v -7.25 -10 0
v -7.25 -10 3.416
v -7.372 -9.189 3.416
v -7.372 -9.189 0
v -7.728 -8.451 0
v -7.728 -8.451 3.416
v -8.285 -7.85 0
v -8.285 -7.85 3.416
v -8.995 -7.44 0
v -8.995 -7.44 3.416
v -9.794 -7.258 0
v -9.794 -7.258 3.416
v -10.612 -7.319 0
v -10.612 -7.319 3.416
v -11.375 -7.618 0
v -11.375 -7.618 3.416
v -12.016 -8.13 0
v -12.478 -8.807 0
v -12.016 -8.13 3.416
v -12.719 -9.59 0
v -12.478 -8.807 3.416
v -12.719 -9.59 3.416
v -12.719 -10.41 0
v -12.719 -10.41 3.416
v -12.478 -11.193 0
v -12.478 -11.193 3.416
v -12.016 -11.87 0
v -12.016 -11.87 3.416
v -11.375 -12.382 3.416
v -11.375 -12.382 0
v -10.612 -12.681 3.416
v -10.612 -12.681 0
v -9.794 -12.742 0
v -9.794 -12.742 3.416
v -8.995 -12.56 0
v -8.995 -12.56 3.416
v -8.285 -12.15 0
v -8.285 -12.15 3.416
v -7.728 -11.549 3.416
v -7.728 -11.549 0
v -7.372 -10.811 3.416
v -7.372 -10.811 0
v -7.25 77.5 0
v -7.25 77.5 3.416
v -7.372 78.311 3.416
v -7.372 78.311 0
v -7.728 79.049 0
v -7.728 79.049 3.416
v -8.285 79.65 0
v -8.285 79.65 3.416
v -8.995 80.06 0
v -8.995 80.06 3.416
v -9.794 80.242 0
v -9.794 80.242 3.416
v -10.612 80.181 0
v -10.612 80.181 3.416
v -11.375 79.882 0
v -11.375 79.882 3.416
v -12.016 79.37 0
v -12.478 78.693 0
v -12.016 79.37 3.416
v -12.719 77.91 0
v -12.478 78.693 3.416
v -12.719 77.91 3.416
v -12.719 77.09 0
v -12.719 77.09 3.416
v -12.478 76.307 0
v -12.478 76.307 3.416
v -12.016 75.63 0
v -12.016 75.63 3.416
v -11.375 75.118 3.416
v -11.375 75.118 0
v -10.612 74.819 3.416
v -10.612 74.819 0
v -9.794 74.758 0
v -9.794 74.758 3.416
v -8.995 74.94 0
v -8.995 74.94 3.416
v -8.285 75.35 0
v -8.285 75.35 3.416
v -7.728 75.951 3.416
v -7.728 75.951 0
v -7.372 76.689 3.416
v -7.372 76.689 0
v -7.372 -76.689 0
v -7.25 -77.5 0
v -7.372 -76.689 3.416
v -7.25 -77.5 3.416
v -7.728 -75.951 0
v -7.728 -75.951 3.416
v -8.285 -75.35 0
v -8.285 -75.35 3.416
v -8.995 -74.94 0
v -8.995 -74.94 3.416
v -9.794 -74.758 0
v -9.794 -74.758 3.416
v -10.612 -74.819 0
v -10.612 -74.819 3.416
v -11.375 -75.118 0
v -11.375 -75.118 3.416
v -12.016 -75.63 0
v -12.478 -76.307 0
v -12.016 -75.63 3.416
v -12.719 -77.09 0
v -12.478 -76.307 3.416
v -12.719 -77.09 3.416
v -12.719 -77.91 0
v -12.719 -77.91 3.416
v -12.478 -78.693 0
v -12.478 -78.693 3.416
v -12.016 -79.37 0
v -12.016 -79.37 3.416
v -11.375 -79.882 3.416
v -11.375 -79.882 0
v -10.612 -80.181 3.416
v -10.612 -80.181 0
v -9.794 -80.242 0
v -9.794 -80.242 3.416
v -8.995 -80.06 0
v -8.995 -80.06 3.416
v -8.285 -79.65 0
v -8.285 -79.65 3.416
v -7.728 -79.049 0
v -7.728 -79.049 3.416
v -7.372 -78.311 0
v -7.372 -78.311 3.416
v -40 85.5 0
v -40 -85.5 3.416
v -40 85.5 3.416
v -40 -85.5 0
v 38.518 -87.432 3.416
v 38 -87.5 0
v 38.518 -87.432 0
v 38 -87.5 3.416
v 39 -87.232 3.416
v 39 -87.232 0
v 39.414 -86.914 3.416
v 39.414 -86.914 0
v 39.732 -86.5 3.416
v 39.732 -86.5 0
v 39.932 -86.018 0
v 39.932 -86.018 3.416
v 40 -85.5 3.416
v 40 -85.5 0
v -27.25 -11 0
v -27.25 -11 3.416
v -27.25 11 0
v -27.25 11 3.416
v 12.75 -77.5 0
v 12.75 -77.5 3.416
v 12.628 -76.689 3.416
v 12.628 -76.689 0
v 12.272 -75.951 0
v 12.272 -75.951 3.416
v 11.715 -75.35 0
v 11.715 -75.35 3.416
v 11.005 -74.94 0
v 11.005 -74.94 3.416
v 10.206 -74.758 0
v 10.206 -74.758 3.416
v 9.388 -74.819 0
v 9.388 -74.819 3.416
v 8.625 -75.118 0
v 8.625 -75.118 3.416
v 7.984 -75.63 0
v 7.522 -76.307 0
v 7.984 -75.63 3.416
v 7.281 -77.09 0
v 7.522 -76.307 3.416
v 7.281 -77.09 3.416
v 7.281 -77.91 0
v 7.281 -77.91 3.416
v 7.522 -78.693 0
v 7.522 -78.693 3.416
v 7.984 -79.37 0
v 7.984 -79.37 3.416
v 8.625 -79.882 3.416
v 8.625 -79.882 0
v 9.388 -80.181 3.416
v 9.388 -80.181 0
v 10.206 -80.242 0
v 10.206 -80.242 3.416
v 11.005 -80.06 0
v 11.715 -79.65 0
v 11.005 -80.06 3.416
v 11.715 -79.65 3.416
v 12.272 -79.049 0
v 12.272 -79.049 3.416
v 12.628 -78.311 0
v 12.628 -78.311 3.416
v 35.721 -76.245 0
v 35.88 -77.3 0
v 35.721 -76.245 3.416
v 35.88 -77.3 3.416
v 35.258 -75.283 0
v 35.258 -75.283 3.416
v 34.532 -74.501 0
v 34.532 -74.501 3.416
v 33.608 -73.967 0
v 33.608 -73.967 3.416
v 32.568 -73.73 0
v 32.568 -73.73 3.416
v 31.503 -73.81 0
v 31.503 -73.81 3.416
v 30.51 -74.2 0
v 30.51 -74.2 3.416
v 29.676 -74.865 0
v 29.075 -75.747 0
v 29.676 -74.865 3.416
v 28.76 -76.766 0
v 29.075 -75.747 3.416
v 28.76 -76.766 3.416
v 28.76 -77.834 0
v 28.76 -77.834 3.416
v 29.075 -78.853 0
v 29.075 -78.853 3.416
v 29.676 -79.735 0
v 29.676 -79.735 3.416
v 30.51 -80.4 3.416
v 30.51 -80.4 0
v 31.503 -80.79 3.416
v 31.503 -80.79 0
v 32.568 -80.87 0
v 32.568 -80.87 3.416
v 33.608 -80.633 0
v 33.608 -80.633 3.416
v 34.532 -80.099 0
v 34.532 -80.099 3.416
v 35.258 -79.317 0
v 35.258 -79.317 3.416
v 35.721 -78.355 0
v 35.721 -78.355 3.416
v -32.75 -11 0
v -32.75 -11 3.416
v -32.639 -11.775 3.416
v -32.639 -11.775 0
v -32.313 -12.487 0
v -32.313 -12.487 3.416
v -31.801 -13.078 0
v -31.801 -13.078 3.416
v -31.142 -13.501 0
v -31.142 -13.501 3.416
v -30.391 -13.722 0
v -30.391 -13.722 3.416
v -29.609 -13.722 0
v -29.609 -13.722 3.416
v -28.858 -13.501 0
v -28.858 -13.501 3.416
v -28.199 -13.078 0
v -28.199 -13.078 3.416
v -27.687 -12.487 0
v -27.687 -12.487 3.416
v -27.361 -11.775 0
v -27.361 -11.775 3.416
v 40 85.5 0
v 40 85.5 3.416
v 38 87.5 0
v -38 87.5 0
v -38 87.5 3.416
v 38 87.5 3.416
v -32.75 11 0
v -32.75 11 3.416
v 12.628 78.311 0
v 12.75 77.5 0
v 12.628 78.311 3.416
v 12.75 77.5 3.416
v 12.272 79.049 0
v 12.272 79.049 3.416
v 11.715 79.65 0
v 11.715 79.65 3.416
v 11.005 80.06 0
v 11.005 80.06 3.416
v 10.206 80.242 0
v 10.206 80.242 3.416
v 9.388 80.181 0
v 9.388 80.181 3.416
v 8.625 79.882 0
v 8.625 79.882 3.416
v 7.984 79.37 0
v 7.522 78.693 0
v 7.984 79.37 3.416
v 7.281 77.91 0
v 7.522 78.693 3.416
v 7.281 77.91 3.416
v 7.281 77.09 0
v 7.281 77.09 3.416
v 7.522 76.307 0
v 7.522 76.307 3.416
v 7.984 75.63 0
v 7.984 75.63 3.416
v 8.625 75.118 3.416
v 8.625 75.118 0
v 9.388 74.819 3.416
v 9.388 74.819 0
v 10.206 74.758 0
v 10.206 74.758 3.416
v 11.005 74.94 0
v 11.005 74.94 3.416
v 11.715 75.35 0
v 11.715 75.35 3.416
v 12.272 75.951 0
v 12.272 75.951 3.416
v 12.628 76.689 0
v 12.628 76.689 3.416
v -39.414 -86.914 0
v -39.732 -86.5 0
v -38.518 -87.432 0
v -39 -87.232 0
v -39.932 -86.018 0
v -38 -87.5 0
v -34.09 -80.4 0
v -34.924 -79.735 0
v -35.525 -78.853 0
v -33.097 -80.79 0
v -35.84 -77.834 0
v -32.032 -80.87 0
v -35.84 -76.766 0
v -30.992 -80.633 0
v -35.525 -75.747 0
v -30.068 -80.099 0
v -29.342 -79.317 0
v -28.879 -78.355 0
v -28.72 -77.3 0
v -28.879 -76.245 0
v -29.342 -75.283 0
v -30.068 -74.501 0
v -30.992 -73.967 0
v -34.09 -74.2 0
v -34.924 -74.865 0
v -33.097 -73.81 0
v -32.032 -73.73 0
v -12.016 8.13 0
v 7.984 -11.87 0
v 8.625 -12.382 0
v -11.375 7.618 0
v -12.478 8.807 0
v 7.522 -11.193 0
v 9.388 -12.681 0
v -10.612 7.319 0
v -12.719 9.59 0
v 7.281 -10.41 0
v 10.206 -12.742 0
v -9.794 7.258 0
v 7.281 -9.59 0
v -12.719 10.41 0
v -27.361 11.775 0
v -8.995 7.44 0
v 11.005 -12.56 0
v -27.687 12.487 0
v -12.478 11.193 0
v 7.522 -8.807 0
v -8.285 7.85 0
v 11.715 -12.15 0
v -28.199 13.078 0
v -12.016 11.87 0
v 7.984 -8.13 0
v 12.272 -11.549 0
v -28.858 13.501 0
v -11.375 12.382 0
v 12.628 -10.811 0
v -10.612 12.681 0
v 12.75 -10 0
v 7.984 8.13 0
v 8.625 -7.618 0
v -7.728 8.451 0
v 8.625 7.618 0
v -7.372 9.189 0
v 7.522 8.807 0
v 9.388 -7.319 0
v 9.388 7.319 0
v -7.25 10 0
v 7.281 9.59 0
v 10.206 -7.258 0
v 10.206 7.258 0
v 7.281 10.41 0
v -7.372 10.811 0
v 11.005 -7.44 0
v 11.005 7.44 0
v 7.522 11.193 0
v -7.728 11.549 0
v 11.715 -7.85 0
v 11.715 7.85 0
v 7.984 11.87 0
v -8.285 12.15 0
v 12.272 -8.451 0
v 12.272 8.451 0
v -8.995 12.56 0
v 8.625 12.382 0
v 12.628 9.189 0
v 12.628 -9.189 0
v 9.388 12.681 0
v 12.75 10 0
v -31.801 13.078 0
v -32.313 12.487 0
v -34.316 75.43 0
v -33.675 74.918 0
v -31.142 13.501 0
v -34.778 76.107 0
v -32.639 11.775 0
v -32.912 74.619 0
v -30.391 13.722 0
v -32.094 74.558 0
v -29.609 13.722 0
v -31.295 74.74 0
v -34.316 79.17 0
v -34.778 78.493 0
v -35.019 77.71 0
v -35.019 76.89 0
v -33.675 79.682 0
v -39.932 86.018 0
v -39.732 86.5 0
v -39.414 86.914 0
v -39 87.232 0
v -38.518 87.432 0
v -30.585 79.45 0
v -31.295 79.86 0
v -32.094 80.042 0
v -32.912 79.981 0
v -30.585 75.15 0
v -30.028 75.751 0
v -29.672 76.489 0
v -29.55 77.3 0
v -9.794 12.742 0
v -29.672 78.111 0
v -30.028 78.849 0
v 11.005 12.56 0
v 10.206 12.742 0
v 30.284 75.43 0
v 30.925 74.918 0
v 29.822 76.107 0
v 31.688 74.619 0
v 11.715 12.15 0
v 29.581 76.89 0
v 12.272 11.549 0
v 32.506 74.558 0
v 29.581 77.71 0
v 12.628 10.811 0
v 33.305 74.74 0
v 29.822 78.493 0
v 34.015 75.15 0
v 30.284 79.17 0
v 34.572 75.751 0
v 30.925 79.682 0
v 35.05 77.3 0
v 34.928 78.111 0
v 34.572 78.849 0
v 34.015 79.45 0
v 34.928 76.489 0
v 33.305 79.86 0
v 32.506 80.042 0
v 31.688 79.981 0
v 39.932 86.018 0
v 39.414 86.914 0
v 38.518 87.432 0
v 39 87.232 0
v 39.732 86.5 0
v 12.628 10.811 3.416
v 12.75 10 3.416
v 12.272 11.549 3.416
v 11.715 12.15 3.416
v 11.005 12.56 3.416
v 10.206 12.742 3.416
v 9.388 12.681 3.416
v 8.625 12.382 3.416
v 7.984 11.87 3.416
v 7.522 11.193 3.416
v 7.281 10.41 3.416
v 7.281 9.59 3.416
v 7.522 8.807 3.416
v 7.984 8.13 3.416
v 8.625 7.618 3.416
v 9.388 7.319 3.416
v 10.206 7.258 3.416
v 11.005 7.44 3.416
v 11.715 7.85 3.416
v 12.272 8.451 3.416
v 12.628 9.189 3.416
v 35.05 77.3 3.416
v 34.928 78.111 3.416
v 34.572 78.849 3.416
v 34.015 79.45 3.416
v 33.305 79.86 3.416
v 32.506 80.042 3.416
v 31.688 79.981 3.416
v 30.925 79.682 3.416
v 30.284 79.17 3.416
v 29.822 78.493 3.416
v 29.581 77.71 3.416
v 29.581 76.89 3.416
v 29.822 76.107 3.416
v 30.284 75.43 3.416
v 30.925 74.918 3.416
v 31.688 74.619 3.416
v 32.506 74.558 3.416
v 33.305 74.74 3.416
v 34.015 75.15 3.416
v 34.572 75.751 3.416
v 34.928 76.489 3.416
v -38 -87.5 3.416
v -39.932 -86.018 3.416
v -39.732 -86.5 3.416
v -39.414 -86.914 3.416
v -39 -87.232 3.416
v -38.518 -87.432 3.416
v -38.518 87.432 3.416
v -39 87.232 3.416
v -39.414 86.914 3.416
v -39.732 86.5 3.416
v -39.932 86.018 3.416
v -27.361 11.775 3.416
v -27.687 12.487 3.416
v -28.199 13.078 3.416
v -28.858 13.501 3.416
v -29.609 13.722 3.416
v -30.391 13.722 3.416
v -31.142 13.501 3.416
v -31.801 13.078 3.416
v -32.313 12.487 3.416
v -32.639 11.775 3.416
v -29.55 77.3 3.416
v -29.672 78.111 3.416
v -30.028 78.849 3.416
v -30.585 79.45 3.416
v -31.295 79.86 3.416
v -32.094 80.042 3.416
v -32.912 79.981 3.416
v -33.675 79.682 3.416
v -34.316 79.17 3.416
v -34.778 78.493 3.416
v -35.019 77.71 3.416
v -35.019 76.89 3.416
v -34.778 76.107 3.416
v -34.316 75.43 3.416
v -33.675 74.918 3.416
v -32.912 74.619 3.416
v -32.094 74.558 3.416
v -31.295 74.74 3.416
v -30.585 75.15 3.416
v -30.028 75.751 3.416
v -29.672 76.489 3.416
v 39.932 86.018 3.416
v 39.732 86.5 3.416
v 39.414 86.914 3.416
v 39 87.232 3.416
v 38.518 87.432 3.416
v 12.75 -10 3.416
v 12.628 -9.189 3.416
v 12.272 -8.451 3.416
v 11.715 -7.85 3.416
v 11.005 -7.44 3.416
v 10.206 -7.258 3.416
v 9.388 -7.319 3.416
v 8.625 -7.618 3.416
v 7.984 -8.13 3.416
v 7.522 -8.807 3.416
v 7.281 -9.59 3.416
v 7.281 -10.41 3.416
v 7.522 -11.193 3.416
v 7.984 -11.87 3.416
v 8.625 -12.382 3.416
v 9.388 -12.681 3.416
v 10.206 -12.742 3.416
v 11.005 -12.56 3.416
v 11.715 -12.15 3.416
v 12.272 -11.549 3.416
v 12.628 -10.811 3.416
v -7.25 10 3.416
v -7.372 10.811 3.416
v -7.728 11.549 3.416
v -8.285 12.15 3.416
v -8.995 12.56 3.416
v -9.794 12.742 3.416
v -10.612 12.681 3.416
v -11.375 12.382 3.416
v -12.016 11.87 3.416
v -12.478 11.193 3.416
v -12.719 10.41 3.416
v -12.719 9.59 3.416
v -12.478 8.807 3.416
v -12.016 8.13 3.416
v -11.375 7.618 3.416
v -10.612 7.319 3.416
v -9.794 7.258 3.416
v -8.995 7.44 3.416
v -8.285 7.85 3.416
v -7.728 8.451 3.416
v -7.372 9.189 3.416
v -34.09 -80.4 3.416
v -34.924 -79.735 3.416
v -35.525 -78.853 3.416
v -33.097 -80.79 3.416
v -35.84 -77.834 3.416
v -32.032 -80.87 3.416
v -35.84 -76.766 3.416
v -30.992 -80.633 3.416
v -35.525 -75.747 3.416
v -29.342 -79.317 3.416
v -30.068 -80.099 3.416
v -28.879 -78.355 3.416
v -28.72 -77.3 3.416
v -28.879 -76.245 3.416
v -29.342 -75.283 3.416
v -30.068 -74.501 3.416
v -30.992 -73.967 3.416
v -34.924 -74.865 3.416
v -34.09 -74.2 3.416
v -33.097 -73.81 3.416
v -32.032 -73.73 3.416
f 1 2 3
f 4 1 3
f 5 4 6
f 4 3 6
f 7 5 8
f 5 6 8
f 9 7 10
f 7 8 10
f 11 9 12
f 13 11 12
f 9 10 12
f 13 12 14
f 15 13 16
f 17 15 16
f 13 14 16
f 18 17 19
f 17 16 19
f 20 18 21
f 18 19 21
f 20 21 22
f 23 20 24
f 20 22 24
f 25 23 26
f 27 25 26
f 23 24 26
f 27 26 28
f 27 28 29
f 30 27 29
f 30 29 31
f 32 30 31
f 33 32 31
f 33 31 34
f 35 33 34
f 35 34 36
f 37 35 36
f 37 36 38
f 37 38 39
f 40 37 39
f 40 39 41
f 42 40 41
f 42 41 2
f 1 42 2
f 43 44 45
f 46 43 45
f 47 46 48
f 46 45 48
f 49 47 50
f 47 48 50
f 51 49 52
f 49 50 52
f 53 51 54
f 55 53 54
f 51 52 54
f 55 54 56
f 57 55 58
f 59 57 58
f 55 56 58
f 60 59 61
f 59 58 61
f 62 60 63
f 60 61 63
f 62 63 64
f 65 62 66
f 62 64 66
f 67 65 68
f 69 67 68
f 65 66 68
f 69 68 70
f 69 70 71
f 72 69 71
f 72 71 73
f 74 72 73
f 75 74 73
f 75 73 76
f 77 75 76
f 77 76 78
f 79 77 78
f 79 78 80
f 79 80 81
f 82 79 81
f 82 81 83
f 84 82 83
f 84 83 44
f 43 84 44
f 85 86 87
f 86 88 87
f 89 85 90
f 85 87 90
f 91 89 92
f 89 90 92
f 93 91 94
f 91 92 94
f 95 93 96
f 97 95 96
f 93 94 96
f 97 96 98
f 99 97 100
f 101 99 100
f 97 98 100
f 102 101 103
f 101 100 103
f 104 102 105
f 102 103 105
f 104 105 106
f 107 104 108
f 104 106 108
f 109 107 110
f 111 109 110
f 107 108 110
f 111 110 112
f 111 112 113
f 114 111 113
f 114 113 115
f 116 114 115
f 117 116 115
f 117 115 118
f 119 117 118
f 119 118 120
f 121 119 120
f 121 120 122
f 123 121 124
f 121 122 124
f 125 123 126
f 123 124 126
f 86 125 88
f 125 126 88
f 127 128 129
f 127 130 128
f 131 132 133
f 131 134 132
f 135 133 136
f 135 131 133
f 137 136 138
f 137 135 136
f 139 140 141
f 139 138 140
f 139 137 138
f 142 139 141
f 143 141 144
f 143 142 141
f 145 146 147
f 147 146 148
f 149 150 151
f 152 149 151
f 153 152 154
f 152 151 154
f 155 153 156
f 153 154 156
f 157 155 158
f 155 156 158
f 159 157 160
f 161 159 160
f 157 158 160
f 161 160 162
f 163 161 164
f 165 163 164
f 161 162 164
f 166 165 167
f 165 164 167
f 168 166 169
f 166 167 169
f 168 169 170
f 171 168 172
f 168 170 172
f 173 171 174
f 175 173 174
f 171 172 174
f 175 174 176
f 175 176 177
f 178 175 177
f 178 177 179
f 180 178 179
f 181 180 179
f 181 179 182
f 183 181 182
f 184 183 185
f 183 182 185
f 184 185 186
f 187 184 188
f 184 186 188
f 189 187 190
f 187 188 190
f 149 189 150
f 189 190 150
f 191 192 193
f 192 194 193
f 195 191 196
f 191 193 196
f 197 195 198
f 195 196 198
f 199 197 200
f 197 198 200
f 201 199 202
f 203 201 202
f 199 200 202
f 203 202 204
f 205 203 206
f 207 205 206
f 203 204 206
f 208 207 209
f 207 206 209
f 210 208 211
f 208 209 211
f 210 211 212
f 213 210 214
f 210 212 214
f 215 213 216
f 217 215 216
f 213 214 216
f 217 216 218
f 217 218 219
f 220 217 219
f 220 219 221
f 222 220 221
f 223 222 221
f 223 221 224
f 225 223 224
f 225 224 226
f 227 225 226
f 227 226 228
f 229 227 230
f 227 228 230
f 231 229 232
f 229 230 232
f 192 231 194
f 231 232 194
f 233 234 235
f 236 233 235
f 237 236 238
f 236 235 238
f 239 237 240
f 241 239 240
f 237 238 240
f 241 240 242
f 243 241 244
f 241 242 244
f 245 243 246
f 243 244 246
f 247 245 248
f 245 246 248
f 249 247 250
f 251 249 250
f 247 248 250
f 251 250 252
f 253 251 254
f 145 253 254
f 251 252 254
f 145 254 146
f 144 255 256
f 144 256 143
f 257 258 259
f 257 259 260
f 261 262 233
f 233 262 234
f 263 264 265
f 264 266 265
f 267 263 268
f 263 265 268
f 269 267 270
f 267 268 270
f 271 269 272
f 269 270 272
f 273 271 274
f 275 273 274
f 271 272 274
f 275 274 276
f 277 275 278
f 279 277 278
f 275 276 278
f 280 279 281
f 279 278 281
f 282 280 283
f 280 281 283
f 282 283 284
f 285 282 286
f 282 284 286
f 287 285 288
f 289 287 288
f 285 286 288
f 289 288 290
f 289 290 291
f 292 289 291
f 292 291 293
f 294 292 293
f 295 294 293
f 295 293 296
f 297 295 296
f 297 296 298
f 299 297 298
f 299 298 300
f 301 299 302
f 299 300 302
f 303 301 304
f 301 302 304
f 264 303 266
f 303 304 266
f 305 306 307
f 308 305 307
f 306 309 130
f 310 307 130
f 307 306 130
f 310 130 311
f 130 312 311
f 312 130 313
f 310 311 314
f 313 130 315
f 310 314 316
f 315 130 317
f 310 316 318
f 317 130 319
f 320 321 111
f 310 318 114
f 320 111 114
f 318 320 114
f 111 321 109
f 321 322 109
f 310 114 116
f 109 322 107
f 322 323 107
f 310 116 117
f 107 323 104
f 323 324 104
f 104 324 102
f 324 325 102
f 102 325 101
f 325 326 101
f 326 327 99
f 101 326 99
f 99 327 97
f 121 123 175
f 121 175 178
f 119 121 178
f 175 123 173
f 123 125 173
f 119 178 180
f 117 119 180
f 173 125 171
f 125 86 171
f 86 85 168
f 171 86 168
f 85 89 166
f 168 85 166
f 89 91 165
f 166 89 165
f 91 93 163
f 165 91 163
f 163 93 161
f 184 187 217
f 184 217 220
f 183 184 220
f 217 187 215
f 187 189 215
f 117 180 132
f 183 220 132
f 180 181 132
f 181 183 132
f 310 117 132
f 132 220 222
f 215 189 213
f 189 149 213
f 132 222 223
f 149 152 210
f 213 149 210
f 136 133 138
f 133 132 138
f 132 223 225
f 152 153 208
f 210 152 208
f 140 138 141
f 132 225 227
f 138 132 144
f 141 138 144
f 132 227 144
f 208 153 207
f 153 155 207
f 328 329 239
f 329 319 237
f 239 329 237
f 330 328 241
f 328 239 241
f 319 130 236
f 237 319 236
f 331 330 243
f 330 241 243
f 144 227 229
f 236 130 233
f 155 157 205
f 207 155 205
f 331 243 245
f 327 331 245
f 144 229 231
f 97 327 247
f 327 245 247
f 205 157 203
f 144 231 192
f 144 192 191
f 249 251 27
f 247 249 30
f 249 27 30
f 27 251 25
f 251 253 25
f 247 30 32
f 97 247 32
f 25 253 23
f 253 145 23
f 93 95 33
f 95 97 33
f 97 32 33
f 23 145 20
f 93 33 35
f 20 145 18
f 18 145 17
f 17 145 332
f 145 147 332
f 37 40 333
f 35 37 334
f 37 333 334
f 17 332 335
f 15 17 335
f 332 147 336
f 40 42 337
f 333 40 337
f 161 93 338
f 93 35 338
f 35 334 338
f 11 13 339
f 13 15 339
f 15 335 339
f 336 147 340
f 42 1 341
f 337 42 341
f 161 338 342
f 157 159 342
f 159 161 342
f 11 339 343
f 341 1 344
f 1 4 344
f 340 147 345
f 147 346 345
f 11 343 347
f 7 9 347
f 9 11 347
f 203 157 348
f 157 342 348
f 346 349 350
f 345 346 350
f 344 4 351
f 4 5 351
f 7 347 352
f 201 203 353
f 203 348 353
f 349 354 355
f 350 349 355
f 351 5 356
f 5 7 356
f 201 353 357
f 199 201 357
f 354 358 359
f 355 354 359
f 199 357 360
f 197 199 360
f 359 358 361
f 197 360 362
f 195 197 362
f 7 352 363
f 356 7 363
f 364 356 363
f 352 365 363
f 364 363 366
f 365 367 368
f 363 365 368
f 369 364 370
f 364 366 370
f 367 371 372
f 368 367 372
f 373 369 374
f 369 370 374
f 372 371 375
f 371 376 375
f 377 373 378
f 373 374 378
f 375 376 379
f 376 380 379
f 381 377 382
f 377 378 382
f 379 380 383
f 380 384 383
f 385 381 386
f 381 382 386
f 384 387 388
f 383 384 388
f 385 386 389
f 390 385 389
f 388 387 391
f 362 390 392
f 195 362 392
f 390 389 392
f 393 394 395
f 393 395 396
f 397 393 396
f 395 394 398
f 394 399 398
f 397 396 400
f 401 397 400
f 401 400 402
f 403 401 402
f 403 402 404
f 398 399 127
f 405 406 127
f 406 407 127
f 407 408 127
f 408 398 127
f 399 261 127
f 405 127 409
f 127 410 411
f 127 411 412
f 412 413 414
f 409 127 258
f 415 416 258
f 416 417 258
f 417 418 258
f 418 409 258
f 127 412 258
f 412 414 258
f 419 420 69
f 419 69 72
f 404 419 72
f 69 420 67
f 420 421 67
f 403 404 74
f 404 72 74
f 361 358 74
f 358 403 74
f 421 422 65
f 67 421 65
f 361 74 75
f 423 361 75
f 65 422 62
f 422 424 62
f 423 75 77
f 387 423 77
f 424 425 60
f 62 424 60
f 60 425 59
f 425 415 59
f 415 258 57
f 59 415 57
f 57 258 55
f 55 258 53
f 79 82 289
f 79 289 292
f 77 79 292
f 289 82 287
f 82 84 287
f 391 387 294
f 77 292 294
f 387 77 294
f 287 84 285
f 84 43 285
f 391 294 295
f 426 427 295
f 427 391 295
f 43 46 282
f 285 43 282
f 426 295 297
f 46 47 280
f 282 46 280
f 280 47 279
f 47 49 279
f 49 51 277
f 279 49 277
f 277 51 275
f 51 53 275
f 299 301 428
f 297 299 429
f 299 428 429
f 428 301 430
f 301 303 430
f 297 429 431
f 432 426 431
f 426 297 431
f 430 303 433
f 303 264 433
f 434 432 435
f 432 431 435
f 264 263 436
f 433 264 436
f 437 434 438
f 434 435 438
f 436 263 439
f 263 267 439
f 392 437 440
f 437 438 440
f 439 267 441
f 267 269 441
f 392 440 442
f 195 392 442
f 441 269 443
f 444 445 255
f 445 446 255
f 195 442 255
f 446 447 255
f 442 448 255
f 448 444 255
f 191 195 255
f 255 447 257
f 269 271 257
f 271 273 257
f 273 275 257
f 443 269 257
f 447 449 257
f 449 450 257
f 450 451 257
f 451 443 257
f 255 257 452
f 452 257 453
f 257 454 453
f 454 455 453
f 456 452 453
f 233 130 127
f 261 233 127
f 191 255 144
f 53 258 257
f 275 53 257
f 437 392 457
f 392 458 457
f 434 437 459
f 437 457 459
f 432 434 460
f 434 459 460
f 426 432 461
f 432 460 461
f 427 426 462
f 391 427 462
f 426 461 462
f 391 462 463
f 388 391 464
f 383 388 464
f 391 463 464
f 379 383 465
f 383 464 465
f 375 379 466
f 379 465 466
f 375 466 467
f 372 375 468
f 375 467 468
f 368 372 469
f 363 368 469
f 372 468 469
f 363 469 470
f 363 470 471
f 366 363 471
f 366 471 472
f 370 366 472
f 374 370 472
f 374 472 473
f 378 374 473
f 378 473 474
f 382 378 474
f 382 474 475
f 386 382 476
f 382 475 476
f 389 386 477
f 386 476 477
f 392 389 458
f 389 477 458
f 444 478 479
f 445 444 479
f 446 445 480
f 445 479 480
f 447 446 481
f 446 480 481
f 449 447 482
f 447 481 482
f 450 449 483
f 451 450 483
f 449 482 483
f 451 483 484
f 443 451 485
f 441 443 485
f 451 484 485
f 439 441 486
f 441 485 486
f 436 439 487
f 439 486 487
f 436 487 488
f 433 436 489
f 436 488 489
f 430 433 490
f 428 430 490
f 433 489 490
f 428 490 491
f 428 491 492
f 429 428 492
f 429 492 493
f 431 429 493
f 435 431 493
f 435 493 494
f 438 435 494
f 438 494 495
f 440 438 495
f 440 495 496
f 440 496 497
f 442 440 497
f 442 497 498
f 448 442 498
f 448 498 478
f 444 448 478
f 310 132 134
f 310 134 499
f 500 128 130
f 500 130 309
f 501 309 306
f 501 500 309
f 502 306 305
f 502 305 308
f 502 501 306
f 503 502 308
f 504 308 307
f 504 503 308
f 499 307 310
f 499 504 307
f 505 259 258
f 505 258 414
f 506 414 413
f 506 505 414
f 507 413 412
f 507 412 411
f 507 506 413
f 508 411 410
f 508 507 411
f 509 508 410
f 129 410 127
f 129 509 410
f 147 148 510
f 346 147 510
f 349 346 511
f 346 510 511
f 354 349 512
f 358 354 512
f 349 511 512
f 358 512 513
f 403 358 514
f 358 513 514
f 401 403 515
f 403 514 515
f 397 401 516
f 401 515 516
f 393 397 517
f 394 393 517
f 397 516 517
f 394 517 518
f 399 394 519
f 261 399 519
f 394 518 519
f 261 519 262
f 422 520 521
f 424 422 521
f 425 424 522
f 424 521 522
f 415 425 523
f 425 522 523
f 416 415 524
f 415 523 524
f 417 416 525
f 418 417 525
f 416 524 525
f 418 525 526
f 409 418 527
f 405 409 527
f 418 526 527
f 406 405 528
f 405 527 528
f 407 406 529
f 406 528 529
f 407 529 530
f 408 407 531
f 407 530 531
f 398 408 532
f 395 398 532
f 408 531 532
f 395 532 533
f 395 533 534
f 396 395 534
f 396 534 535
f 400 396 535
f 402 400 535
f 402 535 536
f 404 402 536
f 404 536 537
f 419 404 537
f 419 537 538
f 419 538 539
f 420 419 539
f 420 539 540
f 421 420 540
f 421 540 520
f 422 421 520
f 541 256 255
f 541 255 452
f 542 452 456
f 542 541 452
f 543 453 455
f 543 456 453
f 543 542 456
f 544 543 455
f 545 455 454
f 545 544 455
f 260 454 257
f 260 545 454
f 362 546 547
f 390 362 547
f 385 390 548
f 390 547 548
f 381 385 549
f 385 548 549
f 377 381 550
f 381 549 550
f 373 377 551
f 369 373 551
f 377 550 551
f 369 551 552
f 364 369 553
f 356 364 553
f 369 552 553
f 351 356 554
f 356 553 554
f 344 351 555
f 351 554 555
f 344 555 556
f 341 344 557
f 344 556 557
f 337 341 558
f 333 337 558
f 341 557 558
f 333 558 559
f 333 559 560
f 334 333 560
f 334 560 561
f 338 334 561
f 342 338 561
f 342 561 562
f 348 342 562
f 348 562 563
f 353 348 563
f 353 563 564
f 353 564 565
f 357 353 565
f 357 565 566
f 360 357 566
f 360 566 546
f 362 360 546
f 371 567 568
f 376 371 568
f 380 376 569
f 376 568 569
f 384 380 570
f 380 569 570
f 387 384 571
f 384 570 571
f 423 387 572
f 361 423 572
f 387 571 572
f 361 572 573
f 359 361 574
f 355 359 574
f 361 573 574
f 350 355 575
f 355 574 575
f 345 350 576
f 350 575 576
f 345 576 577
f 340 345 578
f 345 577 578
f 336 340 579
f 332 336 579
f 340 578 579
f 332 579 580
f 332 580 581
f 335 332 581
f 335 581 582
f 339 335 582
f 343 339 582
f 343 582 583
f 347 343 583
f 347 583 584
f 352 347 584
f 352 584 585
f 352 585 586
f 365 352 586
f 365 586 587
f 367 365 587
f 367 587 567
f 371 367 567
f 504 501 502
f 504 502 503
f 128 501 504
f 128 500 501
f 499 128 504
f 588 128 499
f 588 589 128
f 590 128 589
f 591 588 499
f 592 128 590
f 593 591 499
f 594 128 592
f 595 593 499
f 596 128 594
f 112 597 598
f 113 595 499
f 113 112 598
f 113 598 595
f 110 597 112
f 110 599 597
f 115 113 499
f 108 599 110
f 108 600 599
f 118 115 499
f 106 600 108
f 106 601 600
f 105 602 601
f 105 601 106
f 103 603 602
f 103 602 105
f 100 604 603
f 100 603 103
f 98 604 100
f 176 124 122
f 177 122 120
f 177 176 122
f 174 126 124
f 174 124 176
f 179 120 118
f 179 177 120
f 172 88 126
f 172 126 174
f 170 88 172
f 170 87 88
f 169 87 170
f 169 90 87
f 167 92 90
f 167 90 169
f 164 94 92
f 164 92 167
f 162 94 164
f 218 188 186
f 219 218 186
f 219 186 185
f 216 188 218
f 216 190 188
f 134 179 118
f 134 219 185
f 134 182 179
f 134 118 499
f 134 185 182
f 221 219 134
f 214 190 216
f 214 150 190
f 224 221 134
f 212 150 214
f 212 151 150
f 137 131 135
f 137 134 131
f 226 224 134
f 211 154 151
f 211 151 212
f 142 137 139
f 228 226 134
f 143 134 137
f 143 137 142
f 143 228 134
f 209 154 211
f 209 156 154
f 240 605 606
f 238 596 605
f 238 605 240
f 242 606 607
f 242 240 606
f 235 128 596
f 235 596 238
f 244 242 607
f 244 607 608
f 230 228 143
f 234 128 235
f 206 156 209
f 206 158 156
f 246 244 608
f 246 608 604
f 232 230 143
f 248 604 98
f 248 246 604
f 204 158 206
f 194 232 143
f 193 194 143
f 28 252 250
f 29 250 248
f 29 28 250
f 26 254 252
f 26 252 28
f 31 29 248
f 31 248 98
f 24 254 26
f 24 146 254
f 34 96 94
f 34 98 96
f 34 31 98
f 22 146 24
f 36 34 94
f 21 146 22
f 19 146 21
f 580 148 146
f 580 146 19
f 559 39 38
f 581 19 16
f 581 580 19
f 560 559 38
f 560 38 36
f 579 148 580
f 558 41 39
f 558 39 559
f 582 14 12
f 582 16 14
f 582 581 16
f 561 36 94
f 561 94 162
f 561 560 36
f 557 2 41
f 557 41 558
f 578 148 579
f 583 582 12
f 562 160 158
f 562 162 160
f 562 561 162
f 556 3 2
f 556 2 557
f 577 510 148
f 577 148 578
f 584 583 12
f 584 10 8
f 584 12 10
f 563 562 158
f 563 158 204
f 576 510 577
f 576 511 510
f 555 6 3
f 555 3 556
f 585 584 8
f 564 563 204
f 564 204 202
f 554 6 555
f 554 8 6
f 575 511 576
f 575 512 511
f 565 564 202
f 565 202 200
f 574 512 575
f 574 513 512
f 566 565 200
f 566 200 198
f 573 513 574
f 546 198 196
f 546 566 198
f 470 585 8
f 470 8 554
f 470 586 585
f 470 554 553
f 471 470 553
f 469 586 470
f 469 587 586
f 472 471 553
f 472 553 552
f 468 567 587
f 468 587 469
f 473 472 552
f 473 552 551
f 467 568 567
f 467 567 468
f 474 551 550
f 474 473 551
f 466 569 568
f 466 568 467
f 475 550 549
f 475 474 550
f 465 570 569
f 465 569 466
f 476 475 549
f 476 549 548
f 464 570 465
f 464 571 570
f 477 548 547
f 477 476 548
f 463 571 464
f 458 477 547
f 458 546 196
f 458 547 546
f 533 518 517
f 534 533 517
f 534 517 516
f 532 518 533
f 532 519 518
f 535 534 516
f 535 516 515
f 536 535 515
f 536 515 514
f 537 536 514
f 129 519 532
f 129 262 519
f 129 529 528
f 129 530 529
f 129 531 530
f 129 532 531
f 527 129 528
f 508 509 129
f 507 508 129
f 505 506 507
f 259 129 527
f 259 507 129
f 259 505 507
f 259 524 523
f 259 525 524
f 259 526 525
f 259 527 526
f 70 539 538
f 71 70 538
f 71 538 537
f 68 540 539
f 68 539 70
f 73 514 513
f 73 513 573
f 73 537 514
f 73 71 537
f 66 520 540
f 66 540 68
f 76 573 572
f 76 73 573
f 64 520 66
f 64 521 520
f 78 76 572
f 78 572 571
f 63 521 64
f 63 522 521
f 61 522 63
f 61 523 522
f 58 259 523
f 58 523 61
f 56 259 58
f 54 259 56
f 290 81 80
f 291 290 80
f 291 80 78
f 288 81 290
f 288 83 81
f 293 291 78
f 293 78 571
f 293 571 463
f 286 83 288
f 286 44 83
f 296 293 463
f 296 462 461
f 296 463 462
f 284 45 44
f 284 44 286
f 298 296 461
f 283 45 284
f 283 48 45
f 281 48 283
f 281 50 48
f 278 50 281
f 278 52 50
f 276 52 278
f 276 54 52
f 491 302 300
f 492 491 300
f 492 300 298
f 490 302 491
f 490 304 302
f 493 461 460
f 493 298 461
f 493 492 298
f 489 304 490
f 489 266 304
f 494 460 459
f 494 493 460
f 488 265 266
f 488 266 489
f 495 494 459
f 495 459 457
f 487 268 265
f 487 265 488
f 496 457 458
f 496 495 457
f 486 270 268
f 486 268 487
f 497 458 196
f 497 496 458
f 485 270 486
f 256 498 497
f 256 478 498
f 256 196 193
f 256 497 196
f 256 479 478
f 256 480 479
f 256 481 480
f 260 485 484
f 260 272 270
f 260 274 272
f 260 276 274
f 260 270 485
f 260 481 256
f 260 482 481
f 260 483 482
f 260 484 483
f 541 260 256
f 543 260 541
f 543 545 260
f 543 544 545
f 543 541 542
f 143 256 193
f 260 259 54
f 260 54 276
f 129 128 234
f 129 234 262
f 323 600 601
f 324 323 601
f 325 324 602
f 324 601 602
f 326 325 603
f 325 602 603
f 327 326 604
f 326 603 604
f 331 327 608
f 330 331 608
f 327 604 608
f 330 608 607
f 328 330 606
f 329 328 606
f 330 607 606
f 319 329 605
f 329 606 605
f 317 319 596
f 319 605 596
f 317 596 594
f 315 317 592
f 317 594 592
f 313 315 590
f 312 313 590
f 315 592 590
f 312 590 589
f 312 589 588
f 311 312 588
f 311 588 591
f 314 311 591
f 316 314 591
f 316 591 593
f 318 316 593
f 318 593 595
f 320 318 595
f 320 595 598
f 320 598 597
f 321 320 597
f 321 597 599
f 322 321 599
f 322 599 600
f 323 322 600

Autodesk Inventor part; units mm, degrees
ref_plane "YZ Plane" through (0, 0, 0) normal (1, 0, 0) x (0, 1, 0)
ref_plane "XZ Plane" through (0, 0, 0) normal (0, 1, 0) x (-1, 0, 0)
ref_plane "XY Plane" through (0, 0, 0) normal (0, 0, 1) x (1, 0, 0)
sketch "Sketch1" plane through (0, 0, 0) normal (0, 0, 1) x (1, 0, 0)
  line L0 (-40, 87.5) -> (40, 87.5)
  line L1 (40, 87.5) -> (40, -87.5)
  line L2 (40, -87.5) -> (-40, -87.5)
  line L3 (-40, -87.5) -> (-40, 87.5)
  point P0 (0, 0)
  dimension "d0" = 80
  dimension "d1" = 175
  dimension "d2" = 40
  dimension "d3" = 87.5
extrude "Extrusion1" add sketch "Sketch1" along normal blind 3.4163
sketch "Sketch2" plane through (0, 0, 3.4163) normal (0, 0, 1) x (1, 0, 0)
  line L0 (40, 87.5) -> (-40, 87.5) projected
  line L1 (-40, 87.5) -> (-40, -87.5) projected
  circle A0 centre (-32.3, 77.3) radius 2.75
  circle A1 centre (32.3, 77.3) radius 2.75
  point P0 (0, 0)
  dimension "d6" = 5.5
  dimension "d7" = 10.2
  dimension "d12" = 5.5
  dimension "d13" = 64.6
  dimension "d14" = 7.7
  dimension "d15" = 10.2
extrude "Extrusion2" cut sketch "Sketch2" against normal through all
pattern_linear "Rectangular Pattern1" count 2 spacing 154.6 along (0, -1, 0) of "Extrusion2"
sketch "Sketch3" plane through (0, 0, 3.4163) normal (0, 0, 1) x (1, 0, 0)
  line L0 (40, 87.5) -> (-40, 87.5) projected
  line L1 (-40, 87.5) -> (-40, -87.5) projected
  line L2 (-30, 11) -> (-30, -11) construction
  line L3 (-32.75, 11) -> (-32.75, -11)
  line L4 (-27.25, -11) -> (-27.25, 11)
  arc A0 (-27.25, 11) -> (-32.75, 11) centre (-30, 11) ccw
  arc A1 (-32.75, -11) -> (-27.25, -11) centre (-30, -11) ccw
  point P0 (0, 0)
  point P1 (-30, 0)
  dimension "d25" = 22
  dimension "d26" = 5.5
  dimension "d27" = 76.5
  dimension "d35" = 10
extrude "Extrusion3" cut sketch "Sketch3" against normal through all
sketch "Sketch4" plane through (0, 0, 3.4163) normal (0, 0, 1) x (1, 0, 0)
  circle A0 centre (-32.3, -77.3) radius 2.75 projected
  circle A1 centre (32.3, -77.3) radius 2.75 projected
  circle A2 centre (-32.3, -77.3) radius 3.58
  circle A3 centre (32.3, -77.3) radius 3.58
  point P0 (0, 0)
  dimension "d31" = 7.16
  dimension "d32" = 7.16
extrude "Extrusion4" cut sketch "Sketch4" against normal through all
fillet "Fillet1" radius 2 4 edges at (40, 87.5, 1.7082) (-40, 87.5, 1.7082) (-40, -87.5, 1.7082) (40, -87.5, 1.7082)
sketch "Sketch5" plane through (0, 0, 3.4163) normal (0, 0, 1) x (1, 0, 0)
  line L0 (38, 87.5) -> (-38, 87.5) projected
  line L1 (-40, 85.5) -> (-40, -85.5) projected
  circle A0 centre (-10, 77.5) radius 2.75
  line L2 (-38, -87.5) -> (38, -87.5) projected
  circle A1 centre (-10, 10) radius 2.75
  circle A2 centre (-10, -10) radius 2.75
  circle A3 centre (-10, -77.5) radius 2.75
  point P0 (0, 0)
  dimension "d37" = 5.5
  dimension "d38" = 30
  dimension "d39" = 10
  dimension "d48" = 5.5
  dimension "d49" = 77.5
  dimension "d50" = 5.5
  dimension "d51" = 97.5
  dimension "d52" = 5.5
  dimension "d53" = 10
  dimension "d54" = 30
  dimension "d55" = 30
  dimension "d56" = 30
extrude "Extrusion5" cut sketch "Sketch5" against normal through all
pattern_linear "Rectangular Pattern3" count 2 spacing 20 along (1, 0, 0) of "Extrusion5"
equation "\"d2\" = 0.5 * d0"
equation "\"d3\" = 0.5 * d1"
equation "\"d15\" = d7"
properties part number "x-carriage" material "Steel, Mild"
